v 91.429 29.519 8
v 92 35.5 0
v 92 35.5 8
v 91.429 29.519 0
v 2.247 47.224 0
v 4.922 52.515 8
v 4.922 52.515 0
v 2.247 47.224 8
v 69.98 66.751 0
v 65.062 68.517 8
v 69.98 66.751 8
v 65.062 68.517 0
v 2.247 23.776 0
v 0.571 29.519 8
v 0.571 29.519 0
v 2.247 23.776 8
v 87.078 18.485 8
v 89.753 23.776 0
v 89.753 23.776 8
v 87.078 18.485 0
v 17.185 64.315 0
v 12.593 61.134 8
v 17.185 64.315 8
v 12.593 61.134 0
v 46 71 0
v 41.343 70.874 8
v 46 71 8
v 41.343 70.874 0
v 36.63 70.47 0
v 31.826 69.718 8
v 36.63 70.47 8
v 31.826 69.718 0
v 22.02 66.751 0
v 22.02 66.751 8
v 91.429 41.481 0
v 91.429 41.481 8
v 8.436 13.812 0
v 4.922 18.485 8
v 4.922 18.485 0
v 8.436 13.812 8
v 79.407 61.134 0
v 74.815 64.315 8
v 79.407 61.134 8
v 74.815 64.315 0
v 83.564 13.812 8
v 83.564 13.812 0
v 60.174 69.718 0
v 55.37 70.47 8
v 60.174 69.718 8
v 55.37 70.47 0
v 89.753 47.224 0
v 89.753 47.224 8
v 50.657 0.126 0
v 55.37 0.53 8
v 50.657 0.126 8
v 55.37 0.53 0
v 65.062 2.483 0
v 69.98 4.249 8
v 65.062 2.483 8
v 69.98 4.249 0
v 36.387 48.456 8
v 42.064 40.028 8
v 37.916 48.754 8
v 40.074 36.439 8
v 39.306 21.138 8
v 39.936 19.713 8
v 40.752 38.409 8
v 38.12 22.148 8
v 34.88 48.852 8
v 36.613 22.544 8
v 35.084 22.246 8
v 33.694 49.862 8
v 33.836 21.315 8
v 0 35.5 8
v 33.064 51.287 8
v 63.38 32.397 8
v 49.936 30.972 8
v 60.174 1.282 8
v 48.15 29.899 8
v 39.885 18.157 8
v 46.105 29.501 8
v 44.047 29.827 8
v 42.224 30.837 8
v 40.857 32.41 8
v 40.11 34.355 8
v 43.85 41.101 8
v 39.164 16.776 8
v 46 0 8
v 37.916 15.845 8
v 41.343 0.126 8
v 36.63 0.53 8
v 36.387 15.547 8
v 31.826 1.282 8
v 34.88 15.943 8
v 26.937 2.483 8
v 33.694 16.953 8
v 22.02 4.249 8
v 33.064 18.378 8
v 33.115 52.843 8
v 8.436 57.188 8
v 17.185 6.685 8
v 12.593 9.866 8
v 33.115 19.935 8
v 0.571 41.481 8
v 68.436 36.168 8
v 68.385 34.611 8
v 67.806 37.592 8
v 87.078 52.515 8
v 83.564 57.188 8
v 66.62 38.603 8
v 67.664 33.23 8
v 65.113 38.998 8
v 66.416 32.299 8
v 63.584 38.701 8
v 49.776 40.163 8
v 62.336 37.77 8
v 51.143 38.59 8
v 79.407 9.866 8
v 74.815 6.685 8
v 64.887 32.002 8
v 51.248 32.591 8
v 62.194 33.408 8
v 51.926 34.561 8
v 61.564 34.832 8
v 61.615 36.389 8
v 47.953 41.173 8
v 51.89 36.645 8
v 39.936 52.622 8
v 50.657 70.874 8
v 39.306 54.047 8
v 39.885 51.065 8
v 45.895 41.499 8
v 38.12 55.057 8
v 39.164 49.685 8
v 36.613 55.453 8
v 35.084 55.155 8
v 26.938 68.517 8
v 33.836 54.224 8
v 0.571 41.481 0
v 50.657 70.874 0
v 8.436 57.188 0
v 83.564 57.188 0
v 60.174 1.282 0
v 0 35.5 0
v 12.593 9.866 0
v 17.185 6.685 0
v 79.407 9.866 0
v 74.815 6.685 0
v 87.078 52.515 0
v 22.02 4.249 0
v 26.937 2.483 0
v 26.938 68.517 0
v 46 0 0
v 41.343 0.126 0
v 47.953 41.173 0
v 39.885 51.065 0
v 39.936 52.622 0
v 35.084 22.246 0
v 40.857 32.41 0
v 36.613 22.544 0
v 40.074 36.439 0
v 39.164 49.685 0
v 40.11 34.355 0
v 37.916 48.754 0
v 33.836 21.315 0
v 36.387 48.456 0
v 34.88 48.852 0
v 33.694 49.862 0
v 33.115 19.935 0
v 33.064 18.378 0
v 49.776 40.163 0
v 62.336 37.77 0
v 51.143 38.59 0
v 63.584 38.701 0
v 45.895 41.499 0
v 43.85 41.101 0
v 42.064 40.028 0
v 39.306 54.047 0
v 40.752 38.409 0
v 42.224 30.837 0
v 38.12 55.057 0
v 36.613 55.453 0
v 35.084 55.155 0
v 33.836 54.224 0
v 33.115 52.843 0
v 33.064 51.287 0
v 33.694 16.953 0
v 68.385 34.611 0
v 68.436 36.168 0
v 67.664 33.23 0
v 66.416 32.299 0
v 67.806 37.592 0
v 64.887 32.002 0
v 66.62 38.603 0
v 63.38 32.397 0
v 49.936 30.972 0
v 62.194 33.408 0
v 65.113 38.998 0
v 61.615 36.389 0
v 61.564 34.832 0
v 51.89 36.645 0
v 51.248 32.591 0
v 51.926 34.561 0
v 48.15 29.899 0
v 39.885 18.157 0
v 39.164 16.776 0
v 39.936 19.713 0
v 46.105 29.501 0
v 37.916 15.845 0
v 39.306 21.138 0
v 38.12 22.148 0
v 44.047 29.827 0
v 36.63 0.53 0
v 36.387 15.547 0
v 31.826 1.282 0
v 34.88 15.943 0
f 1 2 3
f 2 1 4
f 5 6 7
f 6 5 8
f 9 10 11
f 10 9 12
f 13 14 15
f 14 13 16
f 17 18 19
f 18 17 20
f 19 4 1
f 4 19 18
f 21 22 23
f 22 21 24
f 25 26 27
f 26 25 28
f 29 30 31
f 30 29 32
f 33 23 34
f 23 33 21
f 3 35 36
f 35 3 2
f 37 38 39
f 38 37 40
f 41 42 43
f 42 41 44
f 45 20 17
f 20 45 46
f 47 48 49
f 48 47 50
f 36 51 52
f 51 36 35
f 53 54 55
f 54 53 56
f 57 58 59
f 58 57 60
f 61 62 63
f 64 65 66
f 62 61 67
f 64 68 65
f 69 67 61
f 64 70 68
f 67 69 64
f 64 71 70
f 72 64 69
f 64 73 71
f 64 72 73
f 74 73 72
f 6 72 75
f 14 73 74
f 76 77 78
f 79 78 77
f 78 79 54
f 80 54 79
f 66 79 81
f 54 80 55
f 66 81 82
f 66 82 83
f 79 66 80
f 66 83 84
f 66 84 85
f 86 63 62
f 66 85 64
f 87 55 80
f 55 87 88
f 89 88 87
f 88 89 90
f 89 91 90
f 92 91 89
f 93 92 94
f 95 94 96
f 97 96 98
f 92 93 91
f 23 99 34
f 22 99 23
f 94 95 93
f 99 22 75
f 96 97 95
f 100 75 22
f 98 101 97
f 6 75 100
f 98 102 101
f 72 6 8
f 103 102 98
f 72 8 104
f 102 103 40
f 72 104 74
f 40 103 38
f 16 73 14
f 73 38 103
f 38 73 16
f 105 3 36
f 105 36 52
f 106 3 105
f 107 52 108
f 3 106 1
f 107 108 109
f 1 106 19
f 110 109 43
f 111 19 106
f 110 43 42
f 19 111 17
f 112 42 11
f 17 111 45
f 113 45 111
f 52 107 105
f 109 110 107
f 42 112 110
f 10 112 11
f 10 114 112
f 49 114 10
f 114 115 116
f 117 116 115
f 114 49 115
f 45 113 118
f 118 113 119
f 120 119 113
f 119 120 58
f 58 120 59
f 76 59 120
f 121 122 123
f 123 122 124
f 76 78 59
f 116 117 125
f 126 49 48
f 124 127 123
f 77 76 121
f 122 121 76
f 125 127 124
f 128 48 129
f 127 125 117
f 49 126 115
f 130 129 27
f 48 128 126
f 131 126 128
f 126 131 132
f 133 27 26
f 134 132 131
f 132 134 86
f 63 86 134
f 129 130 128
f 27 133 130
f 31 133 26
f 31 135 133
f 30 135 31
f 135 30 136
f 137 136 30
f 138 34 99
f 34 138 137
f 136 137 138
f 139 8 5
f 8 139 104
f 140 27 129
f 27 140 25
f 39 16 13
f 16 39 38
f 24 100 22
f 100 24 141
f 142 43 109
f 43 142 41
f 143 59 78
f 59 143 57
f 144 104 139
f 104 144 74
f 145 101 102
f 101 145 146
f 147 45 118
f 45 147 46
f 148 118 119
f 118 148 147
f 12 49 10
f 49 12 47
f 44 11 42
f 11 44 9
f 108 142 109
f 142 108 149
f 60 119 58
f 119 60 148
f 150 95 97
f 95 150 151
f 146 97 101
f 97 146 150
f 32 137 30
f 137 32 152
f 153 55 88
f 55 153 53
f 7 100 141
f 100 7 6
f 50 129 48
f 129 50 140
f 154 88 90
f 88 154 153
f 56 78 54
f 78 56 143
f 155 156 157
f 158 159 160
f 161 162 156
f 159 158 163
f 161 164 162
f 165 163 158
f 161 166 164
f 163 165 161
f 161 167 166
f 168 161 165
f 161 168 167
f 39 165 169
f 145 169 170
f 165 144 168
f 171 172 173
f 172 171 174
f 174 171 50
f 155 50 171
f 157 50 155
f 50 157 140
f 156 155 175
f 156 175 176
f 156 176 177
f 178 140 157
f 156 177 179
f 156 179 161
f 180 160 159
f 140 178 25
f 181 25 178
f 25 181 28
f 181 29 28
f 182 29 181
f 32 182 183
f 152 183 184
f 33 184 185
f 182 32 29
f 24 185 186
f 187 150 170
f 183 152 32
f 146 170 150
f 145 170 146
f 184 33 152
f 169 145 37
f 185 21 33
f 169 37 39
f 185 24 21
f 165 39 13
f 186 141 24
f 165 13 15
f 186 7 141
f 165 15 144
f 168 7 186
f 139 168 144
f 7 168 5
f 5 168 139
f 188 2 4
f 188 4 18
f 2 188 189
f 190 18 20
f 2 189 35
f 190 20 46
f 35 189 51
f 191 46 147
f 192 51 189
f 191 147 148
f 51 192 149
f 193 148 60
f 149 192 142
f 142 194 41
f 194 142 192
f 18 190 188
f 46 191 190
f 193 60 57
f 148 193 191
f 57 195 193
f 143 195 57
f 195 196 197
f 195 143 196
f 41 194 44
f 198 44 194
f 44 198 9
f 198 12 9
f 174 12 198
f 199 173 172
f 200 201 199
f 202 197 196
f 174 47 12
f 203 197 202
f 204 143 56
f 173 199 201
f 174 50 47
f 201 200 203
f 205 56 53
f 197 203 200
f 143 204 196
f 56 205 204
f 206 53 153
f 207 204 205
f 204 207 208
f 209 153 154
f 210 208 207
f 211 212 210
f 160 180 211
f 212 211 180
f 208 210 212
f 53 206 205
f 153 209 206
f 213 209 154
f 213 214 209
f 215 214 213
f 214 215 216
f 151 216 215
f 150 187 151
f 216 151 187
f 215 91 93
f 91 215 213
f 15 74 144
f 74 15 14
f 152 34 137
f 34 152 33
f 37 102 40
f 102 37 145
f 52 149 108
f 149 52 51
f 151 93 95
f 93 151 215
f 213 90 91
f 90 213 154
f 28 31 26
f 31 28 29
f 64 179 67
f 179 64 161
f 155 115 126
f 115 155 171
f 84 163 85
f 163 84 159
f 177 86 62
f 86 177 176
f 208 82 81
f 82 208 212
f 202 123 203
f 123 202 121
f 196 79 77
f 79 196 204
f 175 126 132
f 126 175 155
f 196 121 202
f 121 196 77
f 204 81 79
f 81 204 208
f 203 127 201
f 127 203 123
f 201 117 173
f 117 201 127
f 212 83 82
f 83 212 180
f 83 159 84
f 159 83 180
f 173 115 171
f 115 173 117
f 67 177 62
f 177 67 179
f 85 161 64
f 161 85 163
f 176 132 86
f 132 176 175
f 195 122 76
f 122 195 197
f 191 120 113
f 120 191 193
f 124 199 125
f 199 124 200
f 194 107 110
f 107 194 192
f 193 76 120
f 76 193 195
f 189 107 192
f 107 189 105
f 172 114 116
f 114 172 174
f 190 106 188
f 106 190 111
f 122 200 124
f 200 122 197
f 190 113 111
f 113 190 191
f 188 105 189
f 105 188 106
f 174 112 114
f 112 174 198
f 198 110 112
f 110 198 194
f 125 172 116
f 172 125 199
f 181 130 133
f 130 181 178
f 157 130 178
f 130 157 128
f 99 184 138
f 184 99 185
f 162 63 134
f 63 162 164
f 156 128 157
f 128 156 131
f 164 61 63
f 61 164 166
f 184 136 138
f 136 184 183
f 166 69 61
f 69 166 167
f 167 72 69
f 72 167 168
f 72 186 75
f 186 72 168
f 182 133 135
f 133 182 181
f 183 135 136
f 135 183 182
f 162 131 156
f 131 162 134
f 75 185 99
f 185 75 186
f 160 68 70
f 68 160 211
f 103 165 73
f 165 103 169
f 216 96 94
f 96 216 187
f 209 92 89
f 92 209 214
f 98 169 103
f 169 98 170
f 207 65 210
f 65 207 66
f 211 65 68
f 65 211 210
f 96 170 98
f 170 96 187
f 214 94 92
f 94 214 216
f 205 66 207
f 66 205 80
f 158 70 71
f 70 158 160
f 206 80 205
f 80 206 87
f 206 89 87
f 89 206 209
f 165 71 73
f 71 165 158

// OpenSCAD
$fn = 32;

// ----------------------------------------------------------------------
// Cam plate: double_lobe cam, base R32
// ----------------------------------------------------------------------

// --- parameters (mm) ---
base_r = 32;              // base circle radius
lobe_h = 14;              // cam lobe rise
bore_r = 6;               // shaft bore radius
plate_t = 8;              // plate thickness, Z (extrusion height)
ring_r = 19;              // lightening ring radius
bolt_r = 3.5;             // lightening hole radius

profile = [[92, 35.5], [91.429, 41.481], [89.753, 47.224], [87.078, 52.515], [83.564, 57.188], [79.407, 61.134], [74.815, 64.315], [69.98, 66.751], [65.062, 68.517], [60.174, 69.718], [55.37, 70.47], [50.657, 70.874], [46, 71], [41.343, 70.874], [36.63, 70.47], [31.826, 69.718], [26.938, 68.517], [22.02, 66.751], [17.185, 64.315], [12.593, 61.134], [8.436, 57.188], [4.922, 52.515], [2.247, 47.224], [0.571, 41.481], [0, 35.5], [0.571, 29.519], [2.247, 23.776], [4.922, 18.485], [8.436, 13.812], [12.593, 9.866], [17.185, 6.685], [22.02, 4.249], [26.937, 2.483], [31.826, 1.282], [36.63, 0.53], [41.343, 0.126], [46, 0], [50.657, 0.126], [55.37, 0.53], [60.174, 1.282], [65.062, 2.483], [69.98, 4.249], [74.815, 6.685], [79.407, 9.866], [83.564, 13.812], [87.078, 18.485], [89.753, 23.776], [91.429, 29.519]];  // primary outline, 48 points, counter clockwise
void_1 = [[51.89, 36.645], [51.143, 38.59], [49.776, 40.163], [47.953, 41.173], [45.895, 41.499], [43.85, 41.101], [42.064, 40.028], [40.752, 38.409], [40.074, 36.439], [40.11, 34.355], [40.857, 32.41], [42.224, 30.837], [44.047, 29.827], [46.105, 29.501], [48.15, 29.899], [49.936, 30.972], [51.248, 32.591], [51.926, 34.561]];  // shaft bore, 18 points
void_2 = [[68.436, 36.168], [67.806, 37.592], [66.62, 38.603], [65.113, 38.998], [63.584, 38.701], [62.336, 37.77], [61.615, 36.389], [61.564, 34.832], [62.194, 33.408], [63.38, 32.397], [64.887, 32.002], [66.416, 32.299], [67.664, 33.23], [68.385, 34.611]];  // lightening hole 1, 14 points
void_3 = [[39.936, 52.622], [39.306, 54.047], [38.12, 55.057], [36.613, 55.453], [35.084, 55.155], [33.836, 54.224], [33.115, 52.843], [33.064, 51.287], [33.694, 49.862], [34.88, 48.852], [36.387, 48.456], [37.916, 48.754], [39.164, 49.685], [39.885, 51.065]];  // lightening hole 2, 14 points
void_4 = [[39.936, 19.713], [39.306, 21.138], [38.12, 22.148], [36.613, 22.544], [35.084, 22.246], [33.836, 21.315], [33.115, 19.935], [33.064, 18.378], [33.694, 16.953], [34.88, 15.943], [36.387, 15.547], [37.916, 15.845], [39.164, 16.776], [39.885, 18.157]];  // lightening hole 3, 14 points

// --- the one profile operation ---
difference() {
  linear_extrude(height = plate_t) polygon(points = profile);
  translate([0, 0, -1])
    linear_extrude(height = plate_t + 2) polygon(points = void_1);
  translate([0, 0, -1])
    linear_extrude(height = plate_t + 2) polygon(points = void_2);
  translate([0, 0, -1])
    linear_extrude(height = plate_t + 2) polygon(points = void_3);
  translate([0, 0, -1])
    linear_extrude(height = plate_t + 2) polygon(points = void_4);
}
